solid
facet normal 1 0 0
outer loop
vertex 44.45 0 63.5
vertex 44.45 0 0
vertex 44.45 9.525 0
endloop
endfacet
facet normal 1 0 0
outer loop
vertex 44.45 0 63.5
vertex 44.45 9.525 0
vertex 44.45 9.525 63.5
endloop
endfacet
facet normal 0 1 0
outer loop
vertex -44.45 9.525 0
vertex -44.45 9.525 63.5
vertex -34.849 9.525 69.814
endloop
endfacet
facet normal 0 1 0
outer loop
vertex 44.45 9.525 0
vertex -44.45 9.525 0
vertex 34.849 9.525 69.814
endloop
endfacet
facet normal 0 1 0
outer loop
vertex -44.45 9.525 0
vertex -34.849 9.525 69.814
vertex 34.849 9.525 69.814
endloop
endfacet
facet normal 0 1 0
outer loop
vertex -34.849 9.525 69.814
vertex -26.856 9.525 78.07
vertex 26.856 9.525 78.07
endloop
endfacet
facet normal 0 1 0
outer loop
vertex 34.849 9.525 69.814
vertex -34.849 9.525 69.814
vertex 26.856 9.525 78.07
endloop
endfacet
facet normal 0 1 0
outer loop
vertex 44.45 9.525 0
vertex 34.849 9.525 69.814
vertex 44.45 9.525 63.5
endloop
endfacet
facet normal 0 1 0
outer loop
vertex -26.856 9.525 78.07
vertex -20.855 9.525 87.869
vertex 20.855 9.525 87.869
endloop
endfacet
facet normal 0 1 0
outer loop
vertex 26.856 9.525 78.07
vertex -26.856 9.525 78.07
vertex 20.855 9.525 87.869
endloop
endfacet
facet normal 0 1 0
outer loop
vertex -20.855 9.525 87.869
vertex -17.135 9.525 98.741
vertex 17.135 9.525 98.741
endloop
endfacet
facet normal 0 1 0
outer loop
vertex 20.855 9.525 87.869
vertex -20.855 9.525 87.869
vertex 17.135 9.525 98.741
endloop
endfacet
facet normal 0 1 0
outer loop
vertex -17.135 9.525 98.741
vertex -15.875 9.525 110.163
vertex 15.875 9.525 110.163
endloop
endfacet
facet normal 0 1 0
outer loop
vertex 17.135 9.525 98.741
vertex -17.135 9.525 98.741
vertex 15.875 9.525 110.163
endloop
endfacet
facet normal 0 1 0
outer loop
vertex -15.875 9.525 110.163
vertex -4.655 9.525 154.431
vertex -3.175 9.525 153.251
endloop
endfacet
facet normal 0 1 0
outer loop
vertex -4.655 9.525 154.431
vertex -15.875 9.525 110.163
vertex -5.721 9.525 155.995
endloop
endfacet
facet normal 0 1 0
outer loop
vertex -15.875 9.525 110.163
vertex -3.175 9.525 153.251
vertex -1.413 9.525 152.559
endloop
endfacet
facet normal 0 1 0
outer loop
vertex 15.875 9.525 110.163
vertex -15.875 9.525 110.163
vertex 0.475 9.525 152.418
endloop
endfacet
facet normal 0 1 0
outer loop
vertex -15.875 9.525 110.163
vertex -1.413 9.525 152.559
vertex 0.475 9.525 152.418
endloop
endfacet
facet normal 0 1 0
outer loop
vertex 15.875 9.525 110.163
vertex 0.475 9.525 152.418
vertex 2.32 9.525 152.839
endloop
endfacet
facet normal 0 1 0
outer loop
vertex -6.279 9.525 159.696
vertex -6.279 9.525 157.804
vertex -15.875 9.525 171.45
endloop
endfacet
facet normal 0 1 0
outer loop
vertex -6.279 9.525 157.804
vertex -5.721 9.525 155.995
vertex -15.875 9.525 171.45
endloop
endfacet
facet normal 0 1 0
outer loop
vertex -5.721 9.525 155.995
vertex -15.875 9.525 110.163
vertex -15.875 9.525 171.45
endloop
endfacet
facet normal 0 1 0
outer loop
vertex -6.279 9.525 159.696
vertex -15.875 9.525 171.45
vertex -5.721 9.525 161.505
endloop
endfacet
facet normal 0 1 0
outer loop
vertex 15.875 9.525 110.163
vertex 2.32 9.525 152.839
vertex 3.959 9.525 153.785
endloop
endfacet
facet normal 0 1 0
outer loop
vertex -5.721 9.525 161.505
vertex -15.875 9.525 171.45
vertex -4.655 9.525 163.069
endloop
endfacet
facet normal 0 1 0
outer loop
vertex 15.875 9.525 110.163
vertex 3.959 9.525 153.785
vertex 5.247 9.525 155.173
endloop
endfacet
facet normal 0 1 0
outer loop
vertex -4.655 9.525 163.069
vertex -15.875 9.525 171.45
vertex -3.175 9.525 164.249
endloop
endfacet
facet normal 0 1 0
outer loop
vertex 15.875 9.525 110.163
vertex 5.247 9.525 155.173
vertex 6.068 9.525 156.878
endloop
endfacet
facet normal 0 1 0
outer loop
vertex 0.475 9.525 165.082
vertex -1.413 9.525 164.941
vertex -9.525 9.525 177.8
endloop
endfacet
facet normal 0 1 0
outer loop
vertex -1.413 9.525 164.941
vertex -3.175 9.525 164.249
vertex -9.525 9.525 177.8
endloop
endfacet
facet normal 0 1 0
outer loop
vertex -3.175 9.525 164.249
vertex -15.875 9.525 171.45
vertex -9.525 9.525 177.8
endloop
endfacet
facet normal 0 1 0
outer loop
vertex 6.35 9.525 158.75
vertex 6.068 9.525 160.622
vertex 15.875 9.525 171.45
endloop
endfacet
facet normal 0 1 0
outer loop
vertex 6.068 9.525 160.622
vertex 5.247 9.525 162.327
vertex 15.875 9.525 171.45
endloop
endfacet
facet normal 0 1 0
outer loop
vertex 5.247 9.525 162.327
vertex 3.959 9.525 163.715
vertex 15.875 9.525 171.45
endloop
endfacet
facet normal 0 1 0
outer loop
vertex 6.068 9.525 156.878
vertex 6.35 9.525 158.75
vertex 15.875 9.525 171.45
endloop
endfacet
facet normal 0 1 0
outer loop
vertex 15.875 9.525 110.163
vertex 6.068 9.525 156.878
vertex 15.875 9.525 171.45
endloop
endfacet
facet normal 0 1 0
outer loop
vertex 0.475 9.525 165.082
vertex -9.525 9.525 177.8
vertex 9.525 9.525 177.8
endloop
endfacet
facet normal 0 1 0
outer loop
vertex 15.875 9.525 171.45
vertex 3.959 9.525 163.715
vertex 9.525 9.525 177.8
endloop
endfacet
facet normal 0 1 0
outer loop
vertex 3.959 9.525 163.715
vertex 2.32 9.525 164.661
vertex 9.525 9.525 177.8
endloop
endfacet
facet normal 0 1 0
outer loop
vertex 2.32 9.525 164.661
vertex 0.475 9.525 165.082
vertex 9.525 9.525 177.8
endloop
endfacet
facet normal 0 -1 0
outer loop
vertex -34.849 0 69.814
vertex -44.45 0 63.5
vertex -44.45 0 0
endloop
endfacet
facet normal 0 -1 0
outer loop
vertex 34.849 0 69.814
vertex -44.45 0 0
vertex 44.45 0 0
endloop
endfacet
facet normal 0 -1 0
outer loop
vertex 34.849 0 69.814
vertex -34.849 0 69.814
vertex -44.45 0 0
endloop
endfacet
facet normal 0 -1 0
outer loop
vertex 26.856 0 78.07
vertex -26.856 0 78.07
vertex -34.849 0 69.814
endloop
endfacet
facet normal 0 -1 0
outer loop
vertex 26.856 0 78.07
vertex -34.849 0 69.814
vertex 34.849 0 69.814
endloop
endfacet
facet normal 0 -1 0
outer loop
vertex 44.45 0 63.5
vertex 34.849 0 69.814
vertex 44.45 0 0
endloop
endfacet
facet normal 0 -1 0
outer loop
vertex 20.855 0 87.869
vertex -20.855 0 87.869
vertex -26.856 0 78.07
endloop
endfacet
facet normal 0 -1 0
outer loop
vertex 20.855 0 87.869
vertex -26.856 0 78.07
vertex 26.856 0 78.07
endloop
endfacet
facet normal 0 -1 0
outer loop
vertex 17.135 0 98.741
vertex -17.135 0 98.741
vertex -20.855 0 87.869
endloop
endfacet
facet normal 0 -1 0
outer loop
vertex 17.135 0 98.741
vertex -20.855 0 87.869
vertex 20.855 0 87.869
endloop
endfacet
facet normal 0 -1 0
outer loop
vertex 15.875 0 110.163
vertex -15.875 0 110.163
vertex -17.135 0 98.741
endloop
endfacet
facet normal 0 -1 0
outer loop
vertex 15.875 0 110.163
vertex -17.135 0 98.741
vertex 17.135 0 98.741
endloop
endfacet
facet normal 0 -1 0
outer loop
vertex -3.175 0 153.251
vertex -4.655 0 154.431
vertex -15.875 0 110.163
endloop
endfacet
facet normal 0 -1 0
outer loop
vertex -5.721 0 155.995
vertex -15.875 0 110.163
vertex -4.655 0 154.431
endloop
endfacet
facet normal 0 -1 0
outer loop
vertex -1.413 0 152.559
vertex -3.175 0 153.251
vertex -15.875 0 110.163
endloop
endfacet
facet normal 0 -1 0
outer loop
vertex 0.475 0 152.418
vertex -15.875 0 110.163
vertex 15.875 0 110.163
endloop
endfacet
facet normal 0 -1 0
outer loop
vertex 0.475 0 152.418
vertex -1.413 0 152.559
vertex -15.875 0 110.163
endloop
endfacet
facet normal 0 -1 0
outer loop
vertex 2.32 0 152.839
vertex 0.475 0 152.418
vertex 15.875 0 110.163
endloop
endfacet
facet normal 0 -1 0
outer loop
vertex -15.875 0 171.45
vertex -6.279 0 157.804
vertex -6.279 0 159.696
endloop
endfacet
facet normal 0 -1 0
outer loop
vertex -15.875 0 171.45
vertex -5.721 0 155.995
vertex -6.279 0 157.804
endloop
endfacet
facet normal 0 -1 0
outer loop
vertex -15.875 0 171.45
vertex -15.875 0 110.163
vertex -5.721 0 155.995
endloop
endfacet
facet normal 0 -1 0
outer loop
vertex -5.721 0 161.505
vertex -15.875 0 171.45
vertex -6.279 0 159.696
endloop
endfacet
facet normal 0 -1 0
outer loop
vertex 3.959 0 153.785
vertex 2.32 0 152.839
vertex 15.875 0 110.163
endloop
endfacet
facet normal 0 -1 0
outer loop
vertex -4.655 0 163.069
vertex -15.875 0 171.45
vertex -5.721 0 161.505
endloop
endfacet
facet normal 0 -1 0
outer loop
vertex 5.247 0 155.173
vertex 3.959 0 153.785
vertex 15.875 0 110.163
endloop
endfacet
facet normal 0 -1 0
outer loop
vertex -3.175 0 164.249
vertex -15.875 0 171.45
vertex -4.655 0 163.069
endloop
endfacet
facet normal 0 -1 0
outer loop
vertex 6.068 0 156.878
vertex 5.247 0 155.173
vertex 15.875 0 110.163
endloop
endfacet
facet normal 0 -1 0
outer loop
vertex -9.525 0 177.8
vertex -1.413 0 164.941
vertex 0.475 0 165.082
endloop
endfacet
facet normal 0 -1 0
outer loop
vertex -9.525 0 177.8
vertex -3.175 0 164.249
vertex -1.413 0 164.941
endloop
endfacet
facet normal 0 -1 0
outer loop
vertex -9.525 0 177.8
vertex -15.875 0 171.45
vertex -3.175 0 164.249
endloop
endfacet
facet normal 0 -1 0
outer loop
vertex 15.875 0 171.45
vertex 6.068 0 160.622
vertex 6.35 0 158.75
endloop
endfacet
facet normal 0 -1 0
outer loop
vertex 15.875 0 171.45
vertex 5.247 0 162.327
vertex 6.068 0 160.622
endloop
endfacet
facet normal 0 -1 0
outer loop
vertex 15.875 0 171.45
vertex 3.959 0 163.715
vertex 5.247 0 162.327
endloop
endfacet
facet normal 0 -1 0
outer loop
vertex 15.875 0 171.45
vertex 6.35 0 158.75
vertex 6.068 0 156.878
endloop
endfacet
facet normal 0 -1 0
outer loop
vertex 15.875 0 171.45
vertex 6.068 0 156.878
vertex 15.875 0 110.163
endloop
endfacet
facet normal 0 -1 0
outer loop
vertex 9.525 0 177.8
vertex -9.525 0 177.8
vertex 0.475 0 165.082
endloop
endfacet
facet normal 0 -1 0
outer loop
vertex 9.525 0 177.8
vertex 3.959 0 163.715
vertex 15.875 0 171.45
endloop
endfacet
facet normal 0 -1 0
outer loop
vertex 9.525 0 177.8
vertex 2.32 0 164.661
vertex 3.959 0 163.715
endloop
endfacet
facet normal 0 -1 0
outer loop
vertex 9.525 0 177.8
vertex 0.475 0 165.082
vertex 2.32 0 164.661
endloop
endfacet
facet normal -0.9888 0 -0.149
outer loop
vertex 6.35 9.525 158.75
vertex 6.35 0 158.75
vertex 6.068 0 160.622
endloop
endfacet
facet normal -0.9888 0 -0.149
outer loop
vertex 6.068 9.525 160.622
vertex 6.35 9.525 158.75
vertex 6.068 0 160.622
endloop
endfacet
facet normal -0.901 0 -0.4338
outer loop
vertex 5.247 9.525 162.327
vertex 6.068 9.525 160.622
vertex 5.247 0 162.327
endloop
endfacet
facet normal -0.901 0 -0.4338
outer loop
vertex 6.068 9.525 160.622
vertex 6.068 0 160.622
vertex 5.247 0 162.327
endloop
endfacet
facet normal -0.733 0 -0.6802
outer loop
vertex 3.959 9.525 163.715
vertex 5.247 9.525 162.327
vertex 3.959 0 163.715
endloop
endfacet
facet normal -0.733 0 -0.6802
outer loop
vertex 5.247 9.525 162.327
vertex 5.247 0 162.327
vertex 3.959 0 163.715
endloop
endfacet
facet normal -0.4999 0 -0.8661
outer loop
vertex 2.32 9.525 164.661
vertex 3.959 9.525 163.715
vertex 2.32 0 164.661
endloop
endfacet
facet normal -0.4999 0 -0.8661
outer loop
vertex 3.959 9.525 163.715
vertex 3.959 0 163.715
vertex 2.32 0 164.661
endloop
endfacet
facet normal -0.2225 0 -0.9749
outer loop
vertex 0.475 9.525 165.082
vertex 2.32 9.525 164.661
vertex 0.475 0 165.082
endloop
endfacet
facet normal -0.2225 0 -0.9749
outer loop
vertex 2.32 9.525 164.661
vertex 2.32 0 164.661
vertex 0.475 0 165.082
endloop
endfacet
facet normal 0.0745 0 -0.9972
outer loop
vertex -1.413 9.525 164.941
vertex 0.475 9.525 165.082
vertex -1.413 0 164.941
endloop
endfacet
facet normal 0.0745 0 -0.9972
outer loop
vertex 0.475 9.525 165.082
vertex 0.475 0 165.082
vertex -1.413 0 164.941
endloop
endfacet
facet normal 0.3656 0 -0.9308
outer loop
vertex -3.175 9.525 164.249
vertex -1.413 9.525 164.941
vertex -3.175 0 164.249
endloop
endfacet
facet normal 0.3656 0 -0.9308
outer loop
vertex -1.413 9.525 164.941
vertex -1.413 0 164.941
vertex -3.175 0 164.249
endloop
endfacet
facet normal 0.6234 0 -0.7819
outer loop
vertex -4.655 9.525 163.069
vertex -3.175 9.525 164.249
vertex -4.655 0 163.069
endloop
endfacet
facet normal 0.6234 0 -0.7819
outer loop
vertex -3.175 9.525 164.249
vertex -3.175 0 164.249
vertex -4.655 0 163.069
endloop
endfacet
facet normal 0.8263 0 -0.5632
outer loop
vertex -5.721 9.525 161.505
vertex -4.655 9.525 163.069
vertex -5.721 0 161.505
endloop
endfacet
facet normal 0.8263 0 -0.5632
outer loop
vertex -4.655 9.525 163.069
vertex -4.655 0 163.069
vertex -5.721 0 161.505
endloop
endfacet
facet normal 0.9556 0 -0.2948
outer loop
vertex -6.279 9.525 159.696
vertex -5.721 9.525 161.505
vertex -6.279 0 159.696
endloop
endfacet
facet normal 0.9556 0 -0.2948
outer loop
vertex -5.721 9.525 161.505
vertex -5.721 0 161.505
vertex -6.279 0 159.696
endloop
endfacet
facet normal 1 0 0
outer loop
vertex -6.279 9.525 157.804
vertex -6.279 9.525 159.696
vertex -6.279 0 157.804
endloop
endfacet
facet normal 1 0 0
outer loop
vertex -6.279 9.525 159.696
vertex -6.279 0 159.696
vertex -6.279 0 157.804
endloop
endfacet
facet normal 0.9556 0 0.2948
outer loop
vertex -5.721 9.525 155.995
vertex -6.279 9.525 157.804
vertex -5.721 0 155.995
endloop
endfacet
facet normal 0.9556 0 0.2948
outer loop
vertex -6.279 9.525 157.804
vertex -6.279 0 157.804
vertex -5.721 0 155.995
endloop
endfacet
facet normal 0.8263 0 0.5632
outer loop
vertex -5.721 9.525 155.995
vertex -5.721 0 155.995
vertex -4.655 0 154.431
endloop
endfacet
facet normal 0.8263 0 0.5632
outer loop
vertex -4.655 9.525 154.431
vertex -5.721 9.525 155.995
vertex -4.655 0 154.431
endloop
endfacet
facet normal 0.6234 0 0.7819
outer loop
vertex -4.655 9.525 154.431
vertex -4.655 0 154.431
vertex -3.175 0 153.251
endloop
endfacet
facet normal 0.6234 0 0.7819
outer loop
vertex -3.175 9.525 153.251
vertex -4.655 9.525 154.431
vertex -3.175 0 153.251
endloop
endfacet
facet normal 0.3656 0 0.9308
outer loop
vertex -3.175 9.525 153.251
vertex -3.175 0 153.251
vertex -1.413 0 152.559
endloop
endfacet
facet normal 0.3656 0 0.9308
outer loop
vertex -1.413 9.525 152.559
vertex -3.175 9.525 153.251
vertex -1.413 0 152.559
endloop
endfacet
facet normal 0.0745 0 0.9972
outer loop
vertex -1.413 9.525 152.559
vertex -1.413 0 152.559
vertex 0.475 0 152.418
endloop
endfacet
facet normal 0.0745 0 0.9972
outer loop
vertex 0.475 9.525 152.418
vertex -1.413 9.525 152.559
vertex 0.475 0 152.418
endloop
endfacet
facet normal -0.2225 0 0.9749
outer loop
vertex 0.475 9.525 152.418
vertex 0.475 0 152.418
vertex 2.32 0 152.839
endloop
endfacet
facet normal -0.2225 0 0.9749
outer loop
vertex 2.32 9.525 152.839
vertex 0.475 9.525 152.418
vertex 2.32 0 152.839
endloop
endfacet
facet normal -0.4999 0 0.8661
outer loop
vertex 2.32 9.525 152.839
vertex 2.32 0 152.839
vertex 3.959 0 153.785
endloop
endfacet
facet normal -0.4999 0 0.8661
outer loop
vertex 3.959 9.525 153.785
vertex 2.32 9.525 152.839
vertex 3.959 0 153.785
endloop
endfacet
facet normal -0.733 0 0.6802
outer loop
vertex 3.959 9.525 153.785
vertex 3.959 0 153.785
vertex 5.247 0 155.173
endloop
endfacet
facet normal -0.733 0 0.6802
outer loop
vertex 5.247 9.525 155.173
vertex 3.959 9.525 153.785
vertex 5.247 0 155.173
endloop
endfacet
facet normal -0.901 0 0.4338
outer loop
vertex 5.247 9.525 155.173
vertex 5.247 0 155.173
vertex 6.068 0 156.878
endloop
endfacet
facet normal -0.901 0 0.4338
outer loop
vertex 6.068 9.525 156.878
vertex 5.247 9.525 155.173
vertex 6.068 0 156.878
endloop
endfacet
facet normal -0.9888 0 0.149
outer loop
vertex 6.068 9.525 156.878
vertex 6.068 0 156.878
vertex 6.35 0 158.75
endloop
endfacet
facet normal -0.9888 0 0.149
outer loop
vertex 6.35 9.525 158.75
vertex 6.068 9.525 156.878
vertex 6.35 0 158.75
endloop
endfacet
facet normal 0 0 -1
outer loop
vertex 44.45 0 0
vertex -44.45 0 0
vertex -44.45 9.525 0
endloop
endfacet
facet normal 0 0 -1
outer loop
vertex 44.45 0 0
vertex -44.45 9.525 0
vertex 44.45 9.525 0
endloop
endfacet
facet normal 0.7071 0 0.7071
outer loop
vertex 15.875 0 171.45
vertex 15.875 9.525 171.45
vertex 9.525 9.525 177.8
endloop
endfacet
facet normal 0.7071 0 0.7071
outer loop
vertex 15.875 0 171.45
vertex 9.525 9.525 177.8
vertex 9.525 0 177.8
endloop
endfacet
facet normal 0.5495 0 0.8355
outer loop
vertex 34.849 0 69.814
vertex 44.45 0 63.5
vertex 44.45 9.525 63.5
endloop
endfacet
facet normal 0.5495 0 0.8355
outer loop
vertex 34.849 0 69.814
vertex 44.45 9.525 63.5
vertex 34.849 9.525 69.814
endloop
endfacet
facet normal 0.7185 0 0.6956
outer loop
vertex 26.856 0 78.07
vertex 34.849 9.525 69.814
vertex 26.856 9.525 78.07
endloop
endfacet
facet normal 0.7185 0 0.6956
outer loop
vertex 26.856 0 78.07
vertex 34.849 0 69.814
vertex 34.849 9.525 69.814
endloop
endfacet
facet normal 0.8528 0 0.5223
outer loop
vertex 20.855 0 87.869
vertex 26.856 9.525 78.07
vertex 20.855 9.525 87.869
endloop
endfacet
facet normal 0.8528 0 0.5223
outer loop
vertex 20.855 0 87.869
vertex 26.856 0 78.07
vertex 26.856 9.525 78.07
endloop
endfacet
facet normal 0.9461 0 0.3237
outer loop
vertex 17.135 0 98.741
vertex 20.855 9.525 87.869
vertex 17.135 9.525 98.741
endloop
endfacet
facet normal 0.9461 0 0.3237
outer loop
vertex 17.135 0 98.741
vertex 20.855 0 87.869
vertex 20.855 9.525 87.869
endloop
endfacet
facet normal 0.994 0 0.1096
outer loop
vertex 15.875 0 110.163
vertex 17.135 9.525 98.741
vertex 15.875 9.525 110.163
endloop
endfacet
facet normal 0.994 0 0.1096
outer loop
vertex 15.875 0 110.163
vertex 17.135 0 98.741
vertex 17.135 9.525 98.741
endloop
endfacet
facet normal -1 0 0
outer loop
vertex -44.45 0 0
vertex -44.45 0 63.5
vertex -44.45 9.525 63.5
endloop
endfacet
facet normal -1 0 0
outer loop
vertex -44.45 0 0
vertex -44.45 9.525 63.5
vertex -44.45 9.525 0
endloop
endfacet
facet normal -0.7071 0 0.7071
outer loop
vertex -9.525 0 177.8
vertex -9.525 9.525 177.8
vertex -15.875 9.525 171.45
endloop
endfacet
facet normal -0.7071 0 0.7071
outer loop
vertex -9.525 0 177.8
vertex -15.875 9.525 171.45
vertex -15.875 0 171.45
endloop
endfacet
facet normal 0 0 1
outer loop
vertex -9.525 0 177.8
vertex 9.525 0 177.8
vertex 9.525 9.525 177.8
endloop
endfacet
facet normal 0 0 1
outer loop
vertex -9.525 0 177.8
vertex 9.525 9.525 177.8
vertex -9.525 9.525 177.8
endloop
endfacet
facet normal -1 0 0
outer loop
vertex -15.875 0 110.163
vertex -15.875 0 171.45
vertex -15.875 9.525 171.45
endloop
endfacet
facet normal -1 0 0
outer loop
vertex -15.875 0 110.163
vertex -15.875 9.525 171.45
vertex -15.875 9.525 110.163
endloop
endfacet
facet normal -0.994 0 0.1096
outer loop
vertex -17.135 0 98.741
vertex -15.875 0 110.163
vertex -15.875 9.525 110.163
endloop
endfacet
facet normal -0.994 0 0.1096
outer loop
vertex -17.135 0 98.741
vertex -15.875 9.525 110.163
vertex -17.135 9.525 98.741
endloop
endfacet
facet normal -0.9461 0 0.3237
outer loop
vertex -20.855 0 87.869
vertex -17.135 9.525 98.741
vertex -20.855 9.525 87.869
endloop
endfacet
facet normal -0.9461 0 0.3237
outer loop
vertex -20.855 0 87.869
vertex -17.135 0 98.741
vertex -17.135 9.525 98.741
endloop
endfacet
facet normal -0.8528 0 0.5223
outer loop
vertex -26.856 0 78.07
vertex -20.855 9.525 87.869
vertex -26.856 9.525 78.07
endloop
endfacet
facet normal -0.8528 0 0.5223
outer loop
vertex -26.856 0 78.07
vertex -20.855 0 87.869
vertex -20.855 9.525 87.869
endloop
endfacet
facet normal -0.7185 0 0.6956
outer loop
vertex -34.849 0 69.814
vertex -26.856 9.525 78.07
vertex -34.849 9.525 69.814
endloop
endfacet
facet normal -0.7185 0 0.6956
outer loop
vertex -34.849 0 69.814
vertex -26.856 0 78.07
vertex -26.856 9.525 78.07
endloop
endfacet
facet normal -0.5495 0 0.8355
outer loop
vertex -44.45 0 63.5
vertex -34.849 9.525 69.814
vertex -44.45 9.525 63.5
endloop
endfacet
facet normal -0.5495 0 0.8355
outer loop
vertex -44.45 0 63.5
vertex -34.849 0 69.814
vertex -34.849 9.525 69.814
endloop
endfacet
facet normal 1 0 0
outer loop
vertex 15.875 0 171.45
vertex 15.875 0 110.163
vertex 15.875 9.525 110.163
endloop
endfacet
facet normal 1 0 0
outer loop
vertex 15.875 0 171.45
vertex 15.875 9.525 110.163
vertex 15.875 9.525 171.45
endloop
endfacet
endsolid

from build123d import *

# Parameters (mm, degrees)
F1_DEPTH = 9.525
F2_DEPTH = 6.35
F3_R     = 6.35
F4_DEPTH = 9.526
F5_SIZE  = 6.35


with BuildPart() as f1:
    # F0 (on Front) → F1 (new body)
    with BuildSketch(Plane.XZ):
        with BuildLine():
            Line((-44.45, 63.5), (-44.45, 0))
            Line((-44.45, 0), (44.45, 0))
            Line((44.45, 0), (44.45, 63.5))
            ThreePointArc((44.45, 63.5), (23.58629, 82.8043), (15.875, 110.16278))
            Line((15.875, 110.16278), (15.875, 177.8))
            Line((15.875, 177.8), (-15.875, 177.8))
            Line((-15.875, 177.8), (-15.875, 110.16278))
            ThreePointArc((-15.875, 110.16278), (-23.58629, 82.8043), (-44.45, 63.5))
        make_face()
    extrude(amount=-F1_DEPTH)

    # F0 (on Front) → F2 (join)
    with BuildSketch(Plane.XZ):
        with BuildLine():
            Line((-44.45, 63.5), (-44.45, 0))
            Line((-44.45, 0), (44.45, 0))
            Line((44.45, 0), (44.45, 63.5))
            ThreePointArc((44.45, 63.5), (23.58629, 82.8043), (15.875, 110.16278))
            Line((15.875, 110.16278), (15.875, 177.8))
            Line((15.875, 177.8), (-15.875, 177.8))
            Line((-15.875, 177.8), (-15.875, 110.16278))
            ThreePointArc((-15.875, 110.16278), (-23.58629, 82.8043), (-44.45, 63.5))
        make_face()
    extrude(amount=-F2_DEPTH)

    # F3 (on face) → F4 (cut, through all)
    with BuildSketch(Plane.XZ):
        with Locations((0, 158.75)):
            Circle(F3_R)
    extrude(amount=-F4_DEPTH, mode=Mode.SUBTRACT)

    # F5
    f5_edges = [f1.edges().sort_by_distance(p)[0] for p in [
        (15.875, 4.7625, 177.8),
        (-15.875, 4.7625, 177.8),
    ]]
    chamfer(f5_edges, length=F5_SIZE)


solid = f1.part
